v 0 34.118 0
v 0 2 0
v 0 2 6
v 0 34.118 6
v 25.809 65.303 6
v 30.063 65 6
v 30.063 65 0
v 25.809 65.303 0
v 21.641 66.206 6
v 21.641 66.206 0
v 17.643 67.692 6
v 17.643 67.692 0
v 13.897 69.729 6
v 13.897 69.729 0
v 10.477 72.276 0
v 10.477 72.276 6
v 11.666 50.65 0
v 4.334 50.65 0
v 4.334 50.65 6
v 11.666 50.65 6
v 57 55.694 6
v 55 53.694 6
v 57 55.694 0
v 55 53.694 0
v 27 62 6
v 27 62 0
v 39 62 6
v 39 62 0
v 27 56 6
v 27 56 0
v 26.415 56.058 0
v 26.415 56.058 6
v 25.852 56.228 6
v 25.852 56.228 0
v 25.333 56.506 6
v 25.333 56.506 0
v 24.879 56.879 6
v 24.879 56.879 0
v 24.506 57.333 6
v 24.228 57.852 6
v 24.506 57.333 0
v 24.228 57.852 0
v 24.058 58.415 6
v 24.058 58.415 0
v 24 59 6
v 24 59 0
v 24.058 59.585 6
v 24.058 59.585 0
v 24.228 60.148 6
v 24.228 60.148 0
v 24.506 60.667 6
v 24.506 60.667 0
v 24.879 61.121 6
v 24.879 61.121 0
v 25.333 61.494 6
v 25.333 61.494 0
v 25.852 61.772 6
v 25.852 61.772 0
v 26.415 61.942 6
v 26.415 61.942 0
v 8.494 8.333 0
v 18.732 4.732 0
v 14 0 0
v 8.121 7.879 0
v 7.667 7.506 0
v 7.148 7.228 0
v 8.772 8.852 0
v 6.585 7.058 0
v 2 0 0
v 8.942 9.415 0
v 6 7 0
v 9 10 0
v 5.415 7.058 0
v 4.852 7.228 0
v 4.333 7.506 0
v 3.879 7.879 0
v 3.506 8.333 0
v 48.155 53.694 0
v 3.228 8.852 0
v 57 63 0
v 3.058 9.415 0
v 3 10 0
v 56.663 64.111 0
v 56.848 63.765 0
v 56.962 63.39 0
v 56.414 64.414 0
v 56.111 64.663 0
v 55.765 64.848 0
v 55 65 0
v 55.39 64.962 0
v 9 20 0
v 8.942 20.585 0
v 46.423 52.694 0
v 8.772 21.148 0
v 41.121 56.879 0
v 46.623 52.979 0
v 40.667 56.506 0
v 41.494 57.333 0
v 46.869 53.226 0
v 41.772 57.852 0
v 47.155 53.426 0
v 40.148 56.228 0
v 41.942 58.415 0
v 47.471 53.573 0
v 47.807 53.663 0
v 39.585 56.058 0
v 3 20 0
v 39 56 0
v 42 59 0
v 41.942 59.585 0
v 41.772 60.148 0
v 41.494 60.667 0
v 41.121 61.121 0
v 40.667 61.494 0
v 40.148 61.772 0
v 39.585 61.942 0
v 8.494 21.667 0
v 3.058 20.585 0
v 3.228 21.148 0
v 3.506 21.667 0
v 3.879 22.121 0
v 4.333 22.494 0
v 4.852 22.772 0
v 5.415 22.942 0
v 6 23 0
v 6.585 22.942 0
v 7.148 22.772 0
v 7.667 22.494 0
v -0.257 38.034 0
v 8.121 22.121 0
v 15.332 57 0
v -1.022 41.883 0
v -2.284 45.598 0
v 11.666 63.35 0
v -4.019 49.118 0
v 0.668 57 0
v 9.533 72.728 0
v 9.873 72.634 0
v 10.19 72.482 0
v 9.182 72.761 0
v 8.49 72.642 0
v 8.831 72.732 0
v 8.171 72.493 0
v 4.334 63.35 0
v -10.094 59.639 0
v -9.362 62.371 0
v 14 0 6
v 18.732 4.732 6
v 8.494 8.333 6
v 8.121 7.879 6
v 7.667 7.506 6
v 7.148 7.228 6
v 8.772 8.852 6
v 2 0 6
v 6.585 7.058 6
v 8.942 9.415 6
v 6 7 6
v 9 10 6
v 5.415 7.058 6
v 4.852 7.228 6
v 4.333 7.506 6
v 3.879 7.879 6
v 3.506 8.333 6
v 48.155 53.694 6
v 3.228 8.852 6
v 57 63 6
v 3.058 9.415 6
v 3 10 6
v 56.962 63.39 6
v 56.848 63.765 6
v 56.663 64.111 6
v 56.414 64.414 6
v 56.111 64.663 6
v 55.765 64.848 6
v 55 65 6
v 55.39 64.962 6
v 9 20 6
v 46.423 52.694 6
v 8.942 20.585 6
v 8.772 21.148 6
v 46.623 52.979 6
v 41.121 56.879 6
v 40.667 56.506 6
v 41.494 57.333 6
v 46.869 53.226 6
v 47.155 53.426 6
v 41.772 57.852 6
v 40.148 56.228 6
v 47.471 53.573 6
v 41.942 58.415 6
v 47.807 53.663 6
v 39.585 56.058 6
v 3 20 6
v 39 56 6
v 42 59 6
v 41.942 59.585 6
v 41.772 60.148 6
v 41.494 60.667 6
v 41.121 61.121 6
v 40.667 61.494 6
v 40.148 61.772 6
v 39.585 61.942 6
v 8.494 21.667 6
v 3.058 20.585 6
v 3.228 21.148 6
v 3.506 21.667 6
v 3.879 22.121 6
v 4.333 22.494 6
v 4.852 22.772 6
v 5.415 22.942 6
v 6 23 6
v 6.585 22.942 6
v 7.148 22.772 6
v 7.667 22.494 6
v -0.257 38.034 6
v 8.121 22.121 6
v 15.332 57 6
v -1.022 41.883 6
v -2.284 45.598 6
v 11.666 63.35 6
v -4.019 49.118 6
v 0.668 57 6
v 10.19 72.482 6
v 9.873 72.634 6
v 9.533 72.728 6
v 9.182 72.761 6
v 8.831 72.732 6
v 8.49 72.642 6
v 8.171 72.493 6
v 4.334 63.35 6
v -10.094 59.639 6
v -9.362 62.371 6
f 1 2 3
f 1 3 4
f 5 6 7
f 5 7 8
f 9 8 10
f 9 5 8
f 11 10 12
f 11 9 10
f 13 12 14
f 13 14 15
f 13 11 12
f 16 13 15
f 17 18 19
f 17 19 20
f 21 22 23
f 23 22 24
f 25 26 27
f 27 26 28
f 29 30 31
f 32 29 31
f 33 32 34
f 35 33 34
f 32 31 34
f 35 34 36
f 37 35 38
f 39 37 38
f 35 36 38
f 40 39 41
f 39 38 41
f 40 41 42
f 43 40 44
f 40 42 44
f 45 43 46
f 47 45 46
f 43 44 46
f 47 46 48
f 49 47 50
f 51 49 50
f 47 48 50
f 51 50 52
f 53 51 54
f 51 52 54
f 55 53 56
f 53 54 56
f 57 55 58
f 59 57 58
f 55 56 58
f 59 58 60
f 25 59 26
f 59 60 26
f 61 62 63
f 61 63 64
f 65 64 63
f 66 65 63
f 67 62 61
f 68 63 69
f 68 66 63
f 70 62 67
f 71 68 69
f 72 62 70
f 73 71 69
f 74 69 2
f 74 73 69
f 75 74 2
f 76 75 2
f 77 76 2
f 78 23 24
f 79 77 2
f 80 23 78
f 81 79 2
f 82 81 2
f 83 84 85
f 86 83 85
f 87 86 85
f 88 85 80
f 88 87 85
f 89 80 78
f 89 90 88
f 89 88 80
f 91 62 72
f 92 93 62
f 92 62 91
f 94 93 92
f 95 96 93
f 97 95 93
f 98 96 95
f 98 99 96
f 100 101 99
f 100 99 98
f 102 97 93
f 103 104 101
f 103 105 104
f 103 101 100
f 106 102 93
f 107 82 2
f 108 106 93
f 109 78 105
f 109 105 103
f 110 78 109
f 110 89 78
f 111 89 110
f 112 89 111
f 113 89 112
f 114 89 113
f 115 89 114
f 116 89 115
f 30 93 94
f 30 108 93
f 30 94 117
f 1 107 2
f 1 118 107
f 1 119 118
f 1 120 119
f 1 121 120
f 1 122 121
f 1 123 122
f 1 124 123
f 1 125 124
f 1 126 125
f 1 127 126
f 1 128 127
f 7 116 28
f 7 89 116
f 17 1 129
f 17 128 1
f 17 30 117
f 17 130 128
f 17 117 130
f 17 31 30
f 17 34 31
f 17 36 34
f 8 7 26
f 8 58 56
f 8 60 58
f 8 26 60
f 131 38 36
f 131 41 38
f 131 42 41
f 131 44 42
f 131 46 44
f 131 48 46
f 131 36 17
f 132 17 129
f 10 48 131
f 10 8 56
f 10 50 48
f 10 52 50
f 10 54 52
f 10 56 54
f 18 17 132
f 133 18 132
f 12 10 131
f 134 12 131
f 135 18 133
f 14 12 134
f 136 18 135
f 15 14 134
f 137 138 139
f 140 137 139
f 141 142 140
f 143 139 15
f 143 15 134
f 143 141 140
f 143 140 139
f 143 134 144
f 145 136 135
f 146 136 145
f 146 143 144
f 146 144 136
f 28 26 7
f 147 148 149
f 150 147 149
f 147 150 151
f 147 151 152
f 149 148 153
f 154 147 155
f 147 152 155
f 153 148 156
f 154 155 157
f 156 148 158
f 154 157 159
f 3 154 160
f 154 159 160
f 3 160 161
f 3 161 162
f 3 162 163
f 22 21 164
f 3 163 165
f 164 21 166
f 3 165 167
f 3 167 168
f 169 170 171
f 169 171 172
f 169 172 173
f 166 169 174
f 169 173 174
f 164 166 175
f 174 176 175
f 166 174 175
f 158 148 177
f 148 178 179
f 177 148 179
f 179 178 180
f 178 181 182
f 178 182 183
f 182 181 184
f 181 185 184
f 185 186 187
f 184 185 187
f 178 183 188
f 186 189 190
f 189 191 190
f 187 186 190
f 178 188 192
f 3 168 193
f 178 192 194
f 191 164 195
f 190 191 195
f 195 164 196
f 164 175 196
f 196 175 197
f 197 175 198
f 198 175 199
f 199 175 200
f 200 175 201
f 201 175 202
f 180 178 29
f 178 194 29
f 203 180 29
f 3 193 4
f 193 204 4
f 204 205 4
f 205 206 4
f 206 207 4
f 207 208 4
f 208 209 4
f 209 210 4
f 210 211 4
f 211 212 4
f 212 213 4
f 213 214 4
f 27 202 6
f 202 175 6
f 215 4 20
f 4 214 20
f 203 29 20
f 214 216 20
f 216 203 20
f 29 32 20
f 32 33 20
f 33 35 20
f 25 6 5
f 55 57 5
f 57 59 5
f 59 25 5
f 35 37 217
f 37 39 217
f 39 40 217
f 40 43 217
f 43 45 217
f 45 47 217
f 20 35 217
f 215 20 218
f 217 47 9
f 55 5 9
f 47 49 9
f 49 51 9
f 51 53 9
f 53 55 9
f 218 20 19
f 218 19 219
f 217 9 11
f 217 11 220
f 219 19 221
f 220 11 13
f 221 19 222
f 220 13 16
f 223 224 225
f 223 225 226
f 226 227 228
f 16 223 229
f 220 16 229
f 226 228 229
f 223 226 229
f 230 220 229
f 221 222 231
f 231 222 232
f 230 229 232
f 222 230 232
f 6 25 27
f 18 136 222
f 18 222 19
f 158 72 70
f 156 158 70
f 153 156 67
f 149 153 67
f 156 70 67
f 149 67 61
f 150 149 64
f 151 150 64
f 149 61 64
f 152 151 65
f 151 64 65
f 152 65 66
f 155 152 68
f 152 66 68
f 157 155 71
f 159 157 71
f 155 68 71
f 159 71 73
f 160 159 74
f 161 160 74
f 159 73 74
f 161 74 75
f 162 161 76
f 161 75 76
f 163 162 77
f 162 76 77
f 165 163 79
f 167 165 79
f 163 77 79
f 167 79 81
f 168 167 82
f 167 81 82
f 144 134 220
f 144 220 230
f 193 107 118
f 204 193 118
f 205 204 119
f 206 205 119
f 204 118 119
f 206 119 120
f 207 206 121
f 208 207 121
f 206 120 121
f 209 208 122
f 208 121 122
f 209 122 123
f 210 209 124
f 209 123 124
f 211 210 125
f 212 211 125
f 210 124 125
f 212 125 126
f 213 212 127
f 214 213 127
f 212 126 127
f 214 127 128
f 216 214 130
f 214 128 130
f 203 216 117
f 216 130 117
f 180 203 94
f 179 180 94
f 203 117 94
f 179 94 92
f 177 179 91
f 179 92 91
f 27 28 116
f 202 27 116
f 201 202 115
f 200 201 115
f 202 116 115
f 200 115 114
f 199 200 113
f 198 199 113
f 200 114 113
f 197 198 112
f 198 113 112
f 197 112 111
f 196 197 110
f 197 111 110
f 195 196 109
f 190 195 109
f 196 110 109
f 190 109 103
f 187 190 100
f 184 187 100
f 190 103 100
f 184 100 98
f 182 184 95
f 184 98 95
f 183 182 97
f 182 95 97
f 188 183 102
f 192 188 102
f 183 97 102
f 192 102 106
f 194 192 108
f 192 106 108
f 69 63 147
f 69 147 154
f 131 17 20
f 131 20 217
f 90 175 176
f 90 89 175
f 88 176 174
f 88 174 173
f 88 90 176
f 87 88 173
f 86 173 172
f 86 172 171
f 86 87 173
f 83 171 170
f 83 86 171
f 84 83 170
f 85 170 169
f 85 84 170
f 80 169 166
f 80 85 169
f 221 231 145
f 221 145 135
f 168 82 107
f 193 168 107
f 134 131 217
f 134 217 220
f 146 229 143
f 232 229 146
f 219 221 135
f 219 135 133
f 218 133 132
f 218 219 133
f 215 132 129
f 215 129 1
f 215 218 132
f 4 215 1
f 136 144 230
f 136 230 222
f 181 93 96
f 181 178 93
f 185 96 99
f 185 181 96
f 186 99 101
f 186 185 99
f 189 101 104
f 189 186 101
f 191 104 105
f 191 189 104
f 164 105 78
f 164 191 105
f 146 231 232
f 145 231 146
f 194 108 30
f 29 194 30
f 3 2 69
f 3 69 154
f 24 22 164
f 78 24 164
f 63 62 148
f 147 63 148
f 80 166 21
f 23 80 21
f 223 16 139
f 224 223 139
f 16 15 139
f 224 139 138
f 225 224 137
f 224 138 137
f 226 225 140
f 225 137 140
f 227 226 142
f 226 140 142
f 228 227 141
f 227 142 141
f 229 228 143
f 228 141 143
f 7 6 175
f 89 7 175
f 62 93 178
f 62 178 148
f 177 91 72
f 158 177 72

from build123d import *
from OCP.BRepFilletAPI import BRepFilletAPI_MakeChamfer

# Parameters (mm, degrees)
RESSALTO_EXTRUS_O1_DEPTH = 6
RESSALTO_EXTRUS_O2_DEPTH = 6
FILETE1_R                = 30
CHANFRO1_SIZE            = 2
CHANFRO1_SIZE2           = 5.464101615
FILETE2_R                = 2
RESSALTO_EXTRUS_O3_DEPTH = 6
FILETE3_R                = 2
CHANFRO2_SIZE            = 2


with BuildPart() as part:
    # Esboço1 → Ressalto-extrusão1 (new body)
    with BuildSketch(Plane.XY):
        Polygon((0, 0), (0, 65), (47, 65), (47, 53.693575035), (16, 0), align=None)
        Polygon((4.333825791, 50.65), (11.666174209, 50.65), (15.332348419, 57), (11.666174209, 63.35), (4.333825791, 63.35), (0.667651581, 57), align=None, mode=Mode.SUBTRACT)
        with BuildLine():
            Line((9, 20), (9, 10))
            ThreePointArc((9, 10), (6, 7), (3, 10))
            Line((3, 10), (3, 20))
            ThreePointArc((3, 20), (6, 23), (9, 20))
        make_face(mode=Mode.SUBTRACT)
        with BuildLine():
            Line((27, 62), (39, 62))
            ThreePointArc((39, 62), (42, 59), (39, 56))
            Line((39, 56), (27, 56))
            ThreePointArc((27, 56), (24, 59), (27, 62))
        make_face(mode=Mode.SUBTRACT)
    extrude(amount=RESSALTO_EXTRUS_O1_DEPTH)

    # Esboço2 → Ressalto-extrusão2 (add, through all)
    with BuildSketch(Plane.XY.offset(6)):
        Polygon((14.17764788, 65), (9.431163316, 73.221152423), (-11.093638754, 61.371152423), (0, 42.156406461), (0, 65), align=None)
    extrude(amount=-RESSALTO_EXTRUS_O2_DEPTH)

    # Filete1
    # the kernel refuses this fillet: 30 mm, written as the material it adds along each edge
    with BuildSketch(Plane(origin=(0, 42.156406461, 6), x_dir=(0, -1, 0), z_dir=(0, 0, -1))) as filete1_piece_1:
        with BuildLine():
            CenterArc((FILETE1_R * 0.267949192431, FILETE1_R), FILETE1_R, 240, 30)
            Line((-FILETE1_R * 0.232050807569, FILETE1_R * 0.133974596216), (-FILETE1_R * 0.242050807569, FILETE1_R * 0.11665408814))
            Line((-FILETE1_R * 0.242050807569, FILETE1_R * 0.11665408814), (-FILETE1_R * 0.00535898384862, -FILETE1_R * 0.02))
            Line((-FILETE1_R * 0.00535898384862, -FILETE1_R * 0.02), (FILETE1_R * 0.267949192431, -FILETE1_R * 0.02))
            Line((FILETE1_R * 0.267949192431, -FILETE1_R * 0.02), (FILETE1_R * 0.267949192431, 0))
        make_face()
    extrude(amount=6)
    with BuildSketch(Plane(origin=(14.17764788, 65, 6), x_dir=(1, 0, 0), z_dir=(0, 0, -1))) as filete1_piece_2:
        with BuildLine():
            CenterArc((15.885572973, -30), FILETE1_R, 90, 43.451100673)
            Line((-4.746484564, -8.221152423), (-5.159125715, -7.785575471))
            ThreePointArc((-5.159125715, -7.785575471), (-2.892857524, -3.810576211), (-0.519615242, 0.3))
            Line((-0.519615242, 0.3), (0, 0.6))
            Line((0, 0.6), (15.885572973, 0.6))
            Line((15.885572973, 0.6), (15.885572973, 0))
        make_face()
    extrude(amount=6)

    # Chanfro1: one chamfer whose edges measure the first distance from different faces: ONE call of the kernel's chamfer builder (chamfer() names one face for all edges)
    chanfro1_edges_1 = [part.edges().sort_by_distance(p)[0] for p in [
        (-11.093638754, 61.371152423, 3),
        (0, 0, 3),
        (47, 65, 3),
    ]]
    chanfro1_edges_2 = [part.edges().sort_by_distance(p)[0] for p in [
        (16, 0, 3),
    ]]
    chanfro1_side_2 = [part.faces().sort_by_distance(p)[0] for p in [
        (8, 0, 3),
    ]]
    chanfro1 = BRepFilletAPI_MakeChamfer(part.part.solid().wrapped)
    for e in chanfro1_edges_1:
        chanfro1.Add(CHANFRO1_SIZE, e.wrapped)
    for e in chanfro1_edges_2:
        chanfro1.Add(CHANFRO1_SIZE, CHANFRO1_SIZE2, e.wrapped, chanfro1_side_2[0].wrapped)  # the first distance lies on this face
    add(Compound.cast(chanfro1.Shape()), mode=Mode.REPLACE)

    # Filete2
    filete2_edges = [part.edges().sort_by_distance(p)[0] for p in [
        (9.431163316, 73.221152423, 3),
    ]]
    fillet(filete2_edges, radius=FILETE2_R)

    # Esboço3 → Ressalto-extrusão3 (add, through all)
    with BuildSketch(Plane.XY.offset(6)):
        Polygon((45, 65), (57, 65), (57, 53.693575035), (47, 53.693575035), (47, 63), align=None)
    extrude(amount=-RESSALTO_EXTRUS_O3_DEPTH)

    # Filete3
    filete3_edges = [part.edges().sort_by_distance(p)[0] for p in [
        (57, 65, 3),
        (47, 53.693575035, 3),
    ]]
    fillet(filete3_edges, radius=FILETE3_R)

    # Chanfro2
    chanfro2_edges = [part.edges().sort_by_distance(p)[0] for p in [
        (57, 53.693575035, 3),
    ]]
    chamfer(chanfro2_edges, length=CHANFRO2_SIZE)


solid = part.part
